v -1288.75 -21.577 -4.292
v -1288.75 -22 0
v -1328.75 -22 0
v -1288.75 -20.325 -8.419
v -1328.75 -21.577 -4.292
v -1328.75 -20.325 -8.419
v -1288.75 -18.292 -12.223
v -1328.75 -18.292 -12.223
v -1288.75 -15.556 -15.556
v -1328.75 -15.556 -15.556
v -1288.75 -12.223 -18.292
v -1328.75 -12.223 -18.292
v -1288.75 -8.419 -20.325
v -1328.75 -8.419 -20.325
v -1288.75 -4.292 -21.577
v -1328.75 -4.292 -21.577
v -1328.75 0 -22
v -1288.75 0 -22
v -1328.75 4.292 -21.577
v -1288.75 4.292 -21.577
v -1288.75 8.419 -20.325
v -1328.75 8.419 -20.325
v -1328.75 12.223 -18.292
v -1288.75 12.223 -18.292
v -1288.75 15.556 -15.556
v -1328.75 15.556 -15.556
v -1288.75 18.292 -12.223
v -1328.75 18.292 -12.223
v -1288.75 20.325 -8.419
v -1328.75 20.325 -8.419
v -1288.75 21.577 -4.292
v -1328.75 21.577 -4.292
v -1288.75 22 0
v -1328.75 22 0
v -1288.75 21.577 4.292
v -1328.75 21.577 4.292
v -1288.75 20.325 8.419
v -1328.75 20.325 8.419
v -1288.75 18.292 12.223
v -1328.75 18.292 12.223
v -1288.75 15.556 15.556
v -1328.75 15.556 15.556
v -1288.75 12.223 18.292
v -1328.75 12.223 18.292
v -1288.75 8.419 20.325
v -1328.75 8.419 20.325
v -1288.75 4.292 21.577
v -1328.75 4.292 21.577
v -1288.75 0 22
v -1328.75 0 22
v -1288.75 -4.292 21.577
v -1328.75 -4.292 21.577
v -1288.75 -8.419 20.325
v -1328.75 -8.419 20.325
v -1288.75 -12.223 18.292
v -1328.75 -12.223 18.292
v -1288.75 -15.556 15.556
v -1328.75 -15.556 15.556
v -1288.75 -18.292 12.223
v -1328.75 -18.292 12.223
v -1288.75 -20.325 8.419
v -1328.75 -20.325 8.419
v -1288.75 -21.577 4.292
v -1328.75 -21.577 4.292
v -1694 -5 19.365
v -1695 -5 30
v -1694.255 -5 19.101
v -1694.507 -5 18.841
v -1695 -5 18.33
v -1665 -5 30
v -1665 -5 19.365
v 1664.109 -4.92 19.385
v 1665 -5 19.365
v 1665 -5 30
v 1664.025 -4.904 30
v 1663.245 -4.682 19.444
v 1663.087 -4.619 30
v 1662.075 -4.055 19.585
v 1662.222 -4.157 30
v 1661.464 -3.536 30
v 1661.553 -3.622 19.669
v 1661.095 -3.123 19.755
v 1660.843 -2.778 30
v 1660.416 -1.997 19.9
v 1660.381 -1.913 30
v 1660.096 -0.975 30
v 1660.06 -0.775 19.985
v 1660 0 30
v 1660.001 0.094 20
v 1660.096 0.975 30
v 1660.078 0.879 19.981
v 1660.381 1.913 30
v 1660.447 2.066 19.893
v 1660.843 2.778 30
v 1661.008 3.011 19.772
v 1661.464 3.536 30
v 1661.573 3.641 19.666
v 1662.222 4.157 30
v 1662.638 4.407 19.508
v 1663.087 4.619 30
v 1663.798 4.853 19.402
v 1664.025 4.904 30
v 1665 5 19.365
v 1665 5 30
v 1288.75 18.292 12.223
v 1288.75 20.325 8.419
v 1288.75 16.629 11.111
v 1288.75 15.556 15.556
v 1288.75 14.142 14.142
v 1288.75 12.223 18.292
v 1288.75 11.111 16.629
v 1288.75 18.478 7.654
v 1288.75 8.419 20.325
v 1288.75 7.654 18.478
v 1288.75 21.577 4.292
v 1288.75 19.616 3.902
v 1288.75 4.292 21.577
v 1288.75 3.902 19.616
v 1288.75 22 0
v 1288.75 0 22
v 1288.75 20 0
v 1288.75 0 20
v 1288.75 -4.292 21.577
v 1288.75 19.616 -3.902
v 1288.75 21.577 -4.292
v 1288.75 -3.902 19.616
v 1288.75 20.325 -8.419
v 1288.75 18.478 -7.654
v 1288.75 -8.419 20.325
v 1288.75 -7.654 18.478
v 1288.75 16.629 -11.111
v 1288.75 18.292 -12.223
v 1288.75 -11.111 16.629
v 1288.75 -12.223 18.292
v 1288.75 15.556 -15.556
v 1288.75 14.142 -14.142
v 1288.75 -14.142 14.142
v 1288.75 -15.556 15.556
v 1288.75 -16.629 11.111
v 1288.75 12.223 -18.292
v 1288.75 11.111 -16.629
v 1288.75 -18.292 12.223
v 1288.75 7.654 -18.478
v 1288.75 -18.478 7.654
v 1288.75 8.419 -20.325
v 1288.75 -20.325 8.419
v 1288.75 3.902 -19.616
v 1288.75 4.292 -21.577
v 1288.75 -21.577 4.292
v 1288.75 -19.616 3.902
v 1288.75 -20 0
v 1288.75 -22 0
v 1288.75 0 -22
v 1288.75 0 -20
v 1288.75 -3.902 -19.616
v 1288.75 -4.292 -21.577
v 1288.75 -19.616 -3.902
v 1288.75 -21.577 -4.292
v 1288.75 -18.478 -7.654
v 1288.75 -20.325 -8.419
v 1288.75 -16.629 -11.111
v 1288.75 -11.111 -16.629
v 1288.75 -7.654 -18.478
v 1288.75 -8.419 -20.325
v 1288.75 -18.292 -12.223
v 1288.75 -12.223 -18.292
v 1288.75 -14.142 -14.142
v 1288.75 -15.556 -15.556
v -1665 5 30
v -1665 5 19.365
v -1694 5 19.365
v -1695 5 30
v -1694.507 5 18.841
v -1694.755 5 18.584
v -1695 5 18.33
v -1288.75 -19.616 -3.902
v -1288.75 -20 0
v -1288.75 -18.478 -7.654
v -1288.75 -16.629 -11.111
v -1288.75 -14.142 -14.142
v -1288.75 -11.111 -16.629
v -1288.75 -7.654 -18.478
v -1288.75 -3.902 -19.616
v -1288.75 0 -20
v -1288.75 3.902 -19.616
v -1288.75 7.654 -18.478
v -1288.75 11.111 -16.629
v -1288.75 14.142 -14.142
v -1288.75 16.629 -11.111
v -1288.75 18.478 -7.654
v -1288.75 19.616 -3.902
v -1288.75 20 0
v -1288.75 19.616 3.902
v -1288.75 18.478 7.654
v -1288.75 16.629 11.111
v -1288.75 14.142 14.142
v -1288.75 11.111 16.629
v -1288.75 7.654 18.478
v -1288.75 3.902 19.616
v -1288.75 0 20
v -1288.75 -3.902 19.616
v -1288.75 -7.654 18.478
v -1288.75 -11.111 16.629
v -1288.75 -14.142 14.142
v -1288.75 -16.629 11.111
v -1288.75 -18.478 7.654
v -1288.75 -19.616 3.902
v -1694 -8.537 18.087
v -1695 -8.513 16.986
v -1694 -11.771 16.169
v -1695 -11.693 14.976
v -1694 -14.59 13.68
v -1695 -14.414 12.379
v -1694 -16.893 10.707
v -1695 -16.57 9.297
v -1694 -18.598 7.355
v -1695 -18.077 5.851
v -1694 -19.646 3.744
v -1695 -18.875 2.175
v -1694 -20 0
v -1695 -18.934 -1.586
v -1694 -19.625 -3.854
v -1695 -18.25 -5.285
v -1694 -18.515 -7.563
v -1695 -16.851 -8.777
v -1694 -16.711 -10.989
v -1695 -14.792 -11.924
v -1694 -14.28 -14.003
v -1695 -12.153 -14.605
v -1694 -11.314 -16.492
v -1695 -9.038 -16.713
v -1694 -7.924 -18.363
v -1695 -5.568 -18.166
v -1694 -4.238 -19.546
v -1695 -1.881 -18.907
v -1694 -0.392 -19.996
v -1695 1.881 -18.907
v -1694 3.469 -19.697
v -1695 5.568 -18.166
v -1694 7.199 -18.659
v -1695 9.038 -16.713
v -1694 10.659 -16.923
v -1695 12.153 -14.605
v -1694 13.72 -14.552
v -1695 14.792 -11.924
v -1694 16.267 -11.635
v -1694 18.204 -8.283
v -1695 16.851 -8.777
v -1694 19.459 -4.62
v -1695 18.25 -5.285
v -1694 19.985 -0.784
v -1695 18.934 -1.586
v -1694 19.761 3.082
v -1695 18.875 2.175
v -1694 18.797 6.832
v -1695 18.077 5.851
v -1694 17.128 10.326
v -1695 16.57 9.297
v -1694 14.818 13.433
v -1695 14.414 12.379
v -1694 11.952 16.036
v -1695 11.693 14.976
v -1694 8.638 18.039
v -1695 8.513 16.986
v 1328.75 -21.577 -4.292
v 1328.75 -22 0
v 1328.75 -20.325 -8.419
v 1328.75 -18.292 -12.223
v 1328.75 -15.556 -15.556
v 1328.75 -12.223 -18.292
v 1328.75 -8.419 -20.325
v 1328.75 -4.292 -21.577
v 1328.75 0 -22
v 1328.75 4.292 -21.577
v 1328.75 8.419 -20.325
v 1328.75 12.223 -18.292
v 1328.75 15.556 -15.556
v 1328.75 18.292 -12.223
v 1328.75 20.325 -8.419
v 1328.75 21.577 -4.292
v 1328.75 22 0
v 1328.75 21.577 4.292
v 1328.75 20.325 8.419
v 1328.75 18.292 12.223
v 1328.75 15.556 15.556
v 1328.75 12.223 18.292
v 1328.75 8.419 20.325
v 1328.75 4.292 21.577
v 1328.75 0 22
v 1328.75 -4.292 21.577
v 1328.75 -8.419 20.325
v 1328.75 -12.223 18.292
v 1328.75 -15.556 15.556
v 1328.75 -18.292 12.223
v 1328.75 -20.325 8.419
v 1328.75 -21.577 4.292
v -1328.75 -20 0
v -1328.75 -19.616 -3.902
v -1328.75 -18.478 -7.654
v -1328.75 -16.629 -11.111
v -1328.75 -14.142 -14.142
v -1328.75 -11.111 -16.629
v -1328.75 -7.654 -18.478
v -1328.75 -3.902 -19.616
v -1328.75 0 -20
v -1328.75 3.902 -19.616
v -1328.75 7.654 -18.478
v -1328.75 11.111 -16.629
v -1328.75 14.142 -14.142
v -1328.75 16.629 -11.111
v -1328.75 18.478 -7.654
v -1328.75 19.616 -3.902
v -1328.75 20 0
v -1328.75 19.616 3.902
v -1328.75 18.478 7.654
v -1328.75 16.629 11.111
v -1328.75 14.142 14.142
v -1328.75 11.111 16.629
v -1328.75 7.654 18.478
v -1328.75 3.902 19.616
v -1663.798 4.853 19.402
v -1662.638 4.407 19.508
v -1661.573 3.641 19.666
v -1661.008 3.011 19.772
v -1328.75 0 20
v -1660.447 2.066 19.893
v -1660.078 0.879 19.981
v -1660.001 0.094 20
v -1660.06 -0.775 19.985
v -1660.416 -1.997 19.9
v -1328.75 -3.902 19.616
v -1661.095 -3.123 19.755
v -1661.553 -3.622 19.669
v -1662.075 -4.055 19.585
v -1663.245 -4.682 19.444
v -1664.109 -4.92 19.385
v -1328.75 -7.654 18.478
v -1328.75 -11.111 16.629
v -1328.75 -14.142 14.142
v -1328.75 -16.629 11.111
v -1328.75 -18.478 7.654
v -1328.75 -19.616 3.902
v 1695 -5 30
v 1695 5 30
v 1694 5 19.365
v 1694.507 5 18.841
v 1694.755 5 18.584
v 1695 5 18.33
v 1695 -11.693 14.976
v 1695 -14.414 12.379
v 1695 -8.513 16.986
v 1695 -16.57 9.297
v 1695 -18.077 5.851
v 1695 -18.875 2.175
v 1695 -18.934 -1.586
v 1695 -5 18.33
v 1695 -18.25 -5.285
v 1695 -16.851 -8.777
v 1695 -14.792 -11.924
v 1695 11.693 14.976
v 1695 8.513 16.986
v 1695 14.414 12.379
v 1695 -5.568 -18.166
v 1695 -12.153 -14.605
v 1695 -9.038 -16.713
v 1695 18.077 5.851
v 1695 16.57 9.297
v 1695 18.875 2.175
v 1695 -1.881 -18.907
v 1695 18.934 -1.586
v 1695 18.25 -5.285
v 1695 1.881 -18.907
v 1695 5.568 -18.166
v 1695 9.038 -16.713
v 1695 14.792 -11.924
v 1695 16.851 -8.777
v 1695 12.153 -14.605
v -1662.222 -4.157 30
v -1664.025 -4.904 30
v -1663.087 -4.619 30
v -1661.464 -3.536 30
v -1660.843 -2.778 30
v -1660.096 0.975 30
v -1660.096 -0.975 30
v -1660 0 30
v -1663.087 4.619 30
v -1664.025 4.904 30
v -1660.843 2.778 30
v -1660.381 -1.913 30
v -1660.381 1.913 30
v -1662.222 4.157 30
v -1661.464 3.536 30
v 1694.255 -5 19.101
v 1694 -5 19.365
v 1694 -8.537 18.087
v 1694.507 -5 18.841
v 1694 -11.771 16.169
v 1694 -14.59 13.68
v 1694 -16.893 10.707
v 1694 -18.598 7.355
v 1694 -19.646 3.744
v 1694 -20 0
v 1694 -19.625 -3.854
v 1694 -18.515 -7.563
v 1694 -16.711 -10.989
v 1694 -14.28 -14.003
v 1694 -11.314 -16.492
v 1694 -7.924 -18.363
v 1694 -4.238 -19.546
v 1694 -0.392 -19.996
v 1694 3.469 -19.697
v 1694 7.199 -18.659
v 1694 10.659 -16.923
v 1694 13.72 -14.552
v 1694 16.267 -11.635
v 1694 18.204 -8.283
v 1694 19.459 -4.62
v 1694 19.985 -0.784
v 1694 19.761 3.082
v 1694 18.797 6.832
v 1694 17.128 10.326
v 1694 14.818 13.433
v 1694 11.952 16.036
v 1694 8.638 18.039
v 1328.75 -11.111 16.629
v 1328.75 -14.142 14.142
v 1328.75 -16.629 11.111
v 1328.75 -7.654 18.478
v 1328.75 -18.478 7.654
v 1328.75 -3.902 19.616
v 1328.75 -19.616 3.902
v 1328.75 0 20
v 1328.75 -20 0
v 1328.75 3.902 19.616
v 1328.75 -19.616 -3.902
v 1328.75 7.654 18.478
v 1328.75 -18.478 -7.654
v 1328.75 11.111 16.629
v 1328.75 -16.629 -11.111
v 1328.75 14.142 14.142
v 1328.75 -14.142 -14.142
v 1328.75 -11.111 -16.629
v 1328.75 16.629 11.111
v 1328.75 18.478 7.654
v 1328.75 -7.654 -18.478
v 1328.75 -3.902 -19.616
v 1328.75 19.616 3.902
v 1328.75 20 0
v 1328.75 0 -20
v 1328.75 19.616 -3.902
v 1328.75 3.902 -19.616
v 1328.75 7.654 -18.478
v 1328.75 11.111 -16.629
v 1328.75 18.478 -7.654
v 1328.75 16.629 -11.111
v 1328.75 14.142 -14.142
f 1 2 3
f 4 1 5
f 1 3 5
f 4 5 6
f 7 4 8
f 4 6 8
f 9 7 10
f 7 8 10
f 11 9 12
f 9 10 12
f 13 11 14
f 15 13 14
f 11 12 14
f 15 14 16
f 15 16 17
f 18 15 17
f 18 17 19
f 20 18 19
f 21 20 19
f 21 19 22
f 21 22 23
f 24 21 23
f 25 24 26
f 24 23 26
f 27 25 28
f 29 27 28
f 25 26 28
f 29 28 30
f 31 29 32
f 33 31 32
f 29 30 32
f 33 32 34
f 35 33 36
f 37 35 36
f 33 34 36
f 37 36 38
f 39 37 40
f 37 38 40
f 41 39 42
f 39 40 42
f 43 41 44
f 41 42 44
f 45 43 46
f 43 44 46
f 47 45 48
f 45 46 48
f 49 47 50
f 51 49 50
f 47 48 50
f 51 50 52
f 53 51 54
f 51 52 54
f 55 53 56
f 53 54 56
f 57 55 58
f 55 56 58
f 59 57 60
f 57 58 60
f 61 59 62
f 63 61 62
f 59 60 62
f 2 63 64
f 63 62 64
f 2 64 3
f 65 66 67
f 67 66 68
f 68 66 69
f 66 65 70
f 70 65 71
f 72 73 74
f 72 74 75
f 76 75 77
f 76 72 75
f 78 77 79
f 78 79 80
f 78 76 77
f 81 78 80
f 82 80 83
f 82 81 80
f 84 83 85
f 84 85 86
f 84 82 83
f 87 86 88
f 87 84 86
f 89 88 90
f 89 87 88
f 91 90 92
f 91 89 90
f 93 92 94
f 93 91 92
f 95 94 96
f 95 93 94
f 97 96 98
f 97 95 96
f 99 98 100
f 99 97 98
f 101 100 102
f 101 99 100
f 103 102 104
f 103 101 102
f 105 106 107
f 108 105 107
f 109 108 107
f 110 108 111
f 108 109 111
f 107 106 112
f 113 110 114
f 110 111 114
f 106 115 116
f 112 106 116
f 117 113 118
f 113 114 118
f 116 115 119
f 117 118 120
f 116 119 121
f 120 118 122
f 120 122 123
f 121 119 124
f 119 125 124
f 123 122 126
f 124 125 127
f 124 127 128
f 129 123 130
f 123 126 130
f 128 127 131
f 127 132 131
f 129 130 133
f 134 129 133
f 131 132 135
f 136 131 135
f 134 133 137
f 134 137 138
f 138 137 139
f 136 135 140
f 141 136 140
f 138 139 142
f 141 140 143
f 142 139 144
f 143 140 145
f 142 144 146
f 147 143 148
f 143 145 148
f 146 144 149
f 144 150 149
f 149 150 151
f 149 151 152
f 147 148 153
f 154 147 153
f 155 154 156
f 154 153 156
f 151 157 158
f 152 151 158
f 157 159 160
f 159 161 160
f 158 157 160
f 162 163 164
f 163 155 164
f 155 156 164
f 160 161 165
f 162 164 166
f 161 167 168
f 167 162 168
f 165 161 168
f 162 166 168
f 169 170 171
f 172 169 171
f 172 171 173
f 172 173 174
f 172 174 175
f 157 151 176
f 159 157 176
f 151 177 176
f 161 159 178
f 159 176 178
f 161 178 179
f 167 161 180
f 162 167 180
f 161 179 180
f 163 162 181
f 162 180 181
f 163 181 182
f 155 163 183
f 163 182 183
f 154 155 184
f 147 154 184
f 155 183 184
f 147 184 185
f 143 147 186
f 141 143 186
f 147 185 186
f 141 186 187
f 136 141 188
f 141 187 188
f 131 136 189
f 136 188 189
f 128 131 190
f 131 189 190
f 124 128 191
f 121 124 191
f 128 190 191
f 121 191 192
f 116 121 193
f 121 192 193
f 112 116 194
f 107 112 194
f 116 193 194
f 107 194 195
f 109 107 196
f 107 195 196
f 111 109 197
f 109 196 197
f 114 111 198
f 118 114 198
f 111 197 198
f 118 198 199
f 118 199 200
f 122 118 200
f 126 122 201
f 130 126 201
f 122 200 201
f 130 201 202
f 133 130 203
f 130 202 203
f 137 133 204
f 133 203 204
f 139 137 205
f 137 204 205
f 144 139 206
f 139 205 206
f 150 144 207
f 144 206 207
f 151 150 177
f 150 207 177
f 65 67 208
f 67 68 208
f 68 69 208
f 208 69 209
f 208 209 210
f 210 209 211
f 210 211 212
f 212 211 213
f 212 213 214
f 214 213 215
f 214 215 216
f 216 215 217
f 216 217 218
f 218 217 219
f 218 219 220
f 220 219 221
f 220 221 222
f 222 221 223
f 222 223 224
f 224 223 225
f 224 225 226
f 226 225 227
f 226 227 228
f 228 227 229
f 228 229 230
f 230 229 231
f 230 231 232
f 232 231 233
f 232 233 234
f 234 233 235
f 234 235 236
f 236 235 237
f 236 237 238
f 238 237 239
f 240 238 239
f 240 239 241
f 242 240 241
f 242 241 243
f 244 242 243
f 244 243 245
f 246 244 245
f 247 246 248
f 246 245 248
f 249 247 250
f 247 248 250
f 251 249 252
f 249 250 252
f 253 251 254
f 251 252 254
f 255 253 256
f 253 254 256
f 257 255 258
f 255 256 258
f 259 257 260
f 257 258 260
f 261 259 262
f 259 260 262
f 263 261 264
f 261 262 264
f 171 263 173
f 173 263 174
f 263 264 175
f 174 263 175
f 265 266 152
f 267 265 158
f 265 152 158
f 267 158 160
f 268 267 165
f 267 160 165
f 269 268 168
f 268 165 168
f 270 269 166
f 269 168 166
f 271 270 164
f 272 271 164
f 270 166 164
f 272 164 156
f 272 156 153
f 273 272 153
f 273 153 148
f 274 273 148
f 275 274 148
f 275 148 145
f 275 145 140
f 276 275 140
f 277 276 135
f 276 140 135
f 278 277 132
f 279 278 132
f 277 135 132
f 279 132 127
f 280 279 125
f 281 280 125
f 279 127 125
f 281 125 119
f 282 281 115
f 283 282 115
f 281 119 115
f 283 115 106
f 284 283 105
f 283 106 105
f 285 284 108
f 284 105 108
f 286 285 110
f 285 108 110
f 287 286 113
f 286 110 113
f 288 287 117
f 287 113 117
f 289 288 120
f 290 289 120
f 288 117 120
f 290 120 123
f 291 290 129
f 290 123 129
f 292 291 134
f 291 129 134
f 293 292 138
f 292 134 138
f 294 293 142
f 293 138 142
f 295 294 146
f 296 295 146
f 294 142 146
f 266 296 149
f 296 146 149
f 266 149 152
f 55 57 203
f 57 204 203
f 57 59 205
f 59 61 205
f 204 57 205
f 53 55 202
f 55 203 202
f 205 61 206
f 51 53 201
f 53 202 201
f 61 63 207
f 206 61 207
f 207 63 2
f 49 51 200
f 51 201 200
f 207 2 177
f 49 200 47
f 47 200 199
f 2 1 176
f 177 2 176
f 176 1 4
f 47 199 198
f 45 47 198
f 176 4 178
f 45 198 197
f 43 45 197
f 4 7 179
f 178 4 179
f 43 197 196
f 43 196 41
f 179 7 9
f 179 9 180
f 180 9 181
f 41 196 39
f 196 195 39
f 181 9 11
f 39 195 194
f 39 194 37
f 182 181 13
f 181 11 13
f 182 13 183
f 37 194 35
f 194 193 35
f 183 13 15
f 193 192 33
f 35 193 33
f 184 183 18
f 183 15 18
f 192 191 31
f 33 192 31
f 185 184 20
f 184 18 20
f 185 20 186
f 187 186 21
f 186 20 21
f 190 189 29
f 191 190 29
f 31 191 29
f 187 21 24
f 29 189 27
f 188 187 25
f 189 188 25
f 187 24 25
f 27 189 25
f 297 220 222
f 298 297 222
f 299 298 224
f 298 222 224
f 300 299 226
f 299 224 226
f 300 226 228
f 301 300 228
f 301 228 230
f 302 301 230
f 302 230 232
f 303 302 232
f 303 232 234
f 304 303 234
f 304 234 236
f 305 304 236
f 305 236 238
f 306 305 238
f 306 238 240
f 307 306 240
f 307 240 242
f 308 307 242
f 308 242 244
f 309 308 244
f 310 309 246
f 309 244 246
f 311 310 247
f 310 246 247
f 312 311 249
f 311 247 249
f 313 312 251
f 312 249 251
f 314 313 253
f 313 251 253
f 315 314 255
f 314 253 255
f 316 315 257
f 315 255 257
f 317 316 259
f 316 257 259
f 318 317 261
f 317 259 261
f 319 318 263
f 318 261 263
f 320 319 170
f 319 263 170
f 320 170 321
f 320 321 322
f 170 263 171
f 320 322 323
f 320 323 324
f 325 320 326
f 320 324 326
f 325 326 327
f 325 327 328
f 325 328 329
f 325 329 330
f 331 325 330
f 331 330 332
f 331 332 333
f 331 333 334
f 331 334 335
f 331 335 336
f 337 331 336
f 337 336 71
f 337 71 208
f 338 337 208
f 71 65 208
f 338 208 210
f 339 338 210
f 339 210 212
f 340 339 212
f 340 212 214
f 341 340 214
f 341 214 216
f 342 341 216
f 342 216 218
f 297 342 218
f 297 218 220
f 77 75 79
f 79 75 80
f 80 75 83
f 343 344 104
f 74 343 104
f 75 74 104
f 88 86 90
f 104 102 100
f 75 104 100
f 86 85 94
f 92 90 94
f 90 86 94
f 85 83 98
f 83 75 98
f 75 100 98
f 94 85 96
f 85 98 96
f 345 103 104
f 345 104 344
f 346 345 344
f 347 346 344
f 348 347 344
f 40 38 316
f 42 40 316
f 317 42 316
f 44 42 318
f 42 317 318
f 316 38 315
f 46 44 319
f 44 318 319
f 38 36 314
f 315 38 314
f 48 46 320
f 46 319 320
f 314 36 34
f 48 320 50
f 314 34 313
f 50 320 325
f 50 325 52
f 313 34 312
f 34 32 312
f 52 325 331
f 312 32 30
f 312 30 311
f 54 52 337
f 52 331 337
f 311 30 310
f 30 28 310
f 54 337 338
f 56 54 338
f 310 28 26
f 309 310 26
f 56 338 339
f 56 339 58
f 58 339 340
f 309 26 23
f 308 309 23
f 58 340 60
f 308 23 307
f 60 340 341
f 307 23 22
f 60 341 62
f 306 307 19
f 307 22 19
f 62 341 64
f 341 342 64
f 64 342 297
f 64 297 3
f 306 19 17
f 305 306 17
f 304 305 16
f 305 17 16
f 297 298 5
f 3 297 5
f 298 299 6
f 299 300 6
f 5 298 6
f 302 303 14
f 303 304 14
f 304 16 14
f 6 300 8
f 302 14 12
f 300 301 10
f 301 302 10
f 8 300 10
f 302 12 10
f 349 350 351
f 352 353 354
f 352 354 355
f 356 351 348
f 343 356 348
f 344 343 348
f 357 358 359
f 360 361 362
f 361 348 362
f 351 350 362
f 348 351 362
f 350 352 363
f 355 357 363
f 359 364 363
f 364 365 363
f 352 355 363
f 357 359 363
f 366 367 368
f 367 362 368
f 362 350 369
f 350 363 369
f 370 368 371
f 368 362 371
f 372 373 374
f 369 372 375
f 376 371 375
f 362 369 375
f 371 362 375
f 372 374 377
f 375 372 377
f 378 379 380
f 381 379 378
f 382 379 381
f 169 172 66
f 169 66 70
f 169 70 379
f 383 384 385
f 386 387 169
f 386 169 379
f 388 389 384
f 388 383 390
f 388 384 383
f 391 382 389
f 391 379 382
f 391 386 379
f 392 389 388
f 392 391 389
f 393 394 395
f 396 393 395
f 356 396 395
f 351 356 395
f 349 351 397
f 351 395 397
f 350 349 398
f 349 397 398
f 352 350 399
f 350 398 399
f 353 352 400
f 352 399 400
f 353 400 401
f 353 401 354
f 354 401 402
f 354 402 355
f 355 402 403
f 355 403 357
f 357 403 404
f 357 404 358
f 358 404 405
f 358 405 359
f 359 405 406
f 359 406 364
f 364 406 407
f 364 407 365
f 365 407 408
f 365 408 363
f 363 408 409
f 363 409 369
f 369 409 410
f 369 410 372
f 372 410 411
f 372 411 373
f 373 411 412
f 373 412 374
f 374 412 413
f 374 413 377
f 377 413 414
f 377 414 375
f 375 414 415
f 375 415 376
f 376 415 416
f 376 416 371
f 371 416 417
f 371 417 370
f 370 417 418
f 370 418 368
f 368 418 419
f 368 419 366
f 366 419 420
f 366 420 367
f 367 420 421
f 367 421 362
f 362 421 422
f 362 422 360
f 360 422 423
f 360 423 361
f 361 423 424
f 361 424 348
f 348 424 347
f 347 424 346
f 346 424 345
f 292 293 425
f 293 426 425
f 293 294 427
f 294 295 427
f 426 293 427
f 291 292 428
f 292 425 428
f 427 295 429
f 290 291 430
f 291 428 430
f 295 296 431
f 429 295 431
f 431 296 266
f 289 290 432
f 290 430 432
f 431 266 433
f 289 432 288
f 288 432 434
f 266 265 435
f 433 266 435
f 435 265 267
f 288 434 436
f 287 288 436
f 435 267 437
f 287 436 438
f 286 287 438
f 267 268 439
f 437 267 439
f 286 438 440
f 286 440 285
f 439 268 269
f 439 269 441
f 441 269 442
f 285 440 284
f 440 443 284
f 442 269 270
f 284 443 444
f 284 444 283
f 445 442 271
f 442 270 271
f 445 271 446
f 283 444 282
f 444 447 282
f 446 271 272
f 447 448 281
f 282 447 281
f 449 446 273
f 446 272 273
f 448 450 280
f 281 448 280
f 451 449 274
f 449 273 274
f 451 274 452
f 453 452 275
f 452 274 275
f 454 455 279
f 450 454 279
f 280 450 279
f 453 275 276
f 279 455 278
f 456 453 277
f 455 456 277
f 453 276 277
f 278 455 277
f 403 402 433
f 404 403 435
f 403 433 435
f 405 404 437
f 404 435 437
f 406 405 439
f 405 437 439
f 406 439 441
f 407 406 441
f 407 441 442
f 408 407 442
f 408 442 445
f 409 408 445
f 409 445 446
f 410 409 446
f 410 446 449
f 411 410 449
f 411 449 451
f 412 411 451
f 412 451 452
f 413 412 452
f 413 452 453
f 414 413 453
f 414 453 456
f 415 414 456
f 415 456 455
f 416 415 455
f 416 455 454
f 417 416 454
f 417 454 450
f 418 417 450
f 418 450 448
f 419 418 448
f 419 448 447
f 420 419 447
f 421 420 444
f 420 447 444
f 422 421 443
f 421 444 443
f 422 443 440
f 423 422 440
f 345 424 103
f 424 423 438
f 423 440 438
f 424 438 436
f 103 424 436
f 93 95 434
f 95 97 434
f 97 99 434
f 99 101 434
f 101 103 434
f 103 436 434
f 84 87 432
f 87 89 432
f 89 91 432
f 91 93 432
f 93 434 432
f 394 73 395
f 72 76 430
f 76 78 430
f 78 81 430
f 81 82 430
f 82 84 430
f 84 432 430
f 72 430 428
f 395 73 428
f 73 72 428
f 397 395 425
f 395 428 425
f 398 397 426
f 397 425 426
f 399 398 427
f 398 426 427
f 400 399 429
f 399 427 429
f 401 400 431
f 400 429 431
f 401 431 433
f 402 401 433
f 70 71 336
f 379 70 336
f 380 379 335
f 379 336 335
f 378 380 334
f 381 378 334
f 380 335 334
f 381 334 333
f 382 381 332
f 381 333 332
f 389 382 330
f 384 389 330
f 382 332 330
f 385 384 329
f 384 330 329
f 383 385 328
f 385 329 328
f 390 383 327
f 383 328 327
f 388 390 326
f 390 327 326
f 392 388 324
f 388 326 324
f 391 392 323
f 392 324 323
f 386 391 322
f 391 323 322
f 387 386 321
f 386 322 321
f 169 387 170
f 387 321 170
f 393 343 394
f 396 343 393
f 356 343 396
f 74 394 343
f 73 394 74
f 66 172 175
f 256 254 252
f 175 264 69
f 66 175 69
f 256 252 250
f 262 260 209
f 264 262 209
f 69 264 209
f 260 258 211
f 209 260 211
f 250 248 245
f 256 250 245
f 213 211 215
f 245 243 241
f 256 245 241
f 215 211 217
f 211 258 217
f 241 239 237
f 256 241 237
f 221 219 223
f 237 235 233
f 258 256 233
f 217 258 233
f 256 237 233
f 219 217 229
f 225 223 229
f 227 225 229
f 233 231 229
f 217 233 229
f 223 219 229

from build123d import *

# Parameters (mm, degrees)
CHAMFER1_SIZE            = 1
BOSS_EXTRUDE2_DEPTH      = 10
BOSS_EXTRUDE2_DEPTH_BACK = 5


with BuildPart() as part:
    # Sketch1 → Revolve1 (revolve)
    with BuildSketch(Plane.XY):
        Polygon((-1695, 0), (1695, 0), (1695, -20), (1328.75, -20), (1328.75, -22), (1288.75, -22), (1288.75, -20), (-1288.75, -20), (-1288.75, -22), (-1328.75, -22), (-1328.75, -20), (-1695, -20), align=None)
    revolve(axis=Axis((-1695, 0, 0), (1, 0, 0)))

    # Chamfer1
    chamfer1_edges = [part.edges().sort_by_distance(p)[0] for p in [
        (1695, 20, 0),
        (-1695, 20, 0),
    ]]
    chamfer(chamfer1_edges, length=CHAMFER1_SIZE)

    # Sketch3 → Boss-Extrude2 (add, two sides: drawn at the far end of the back side and taken through both)
    with BuildSketch(Plane.XY.offset(20).offset(-BOSS_EXTRUDE2_DEPTH_BACK)):
        with BuildLine():
            Line((1665, 5), (1695, 5))
            Line((1695, 5), (1695, -5))
            Line((1695, -5), (1665, -5))
            ThreePointArc((1665, -5), (1660, 0), (1665, 5))
        make_face()
        with BuildLine():
            Line((-1695, 5), (-1695, -5))
            Line((-1695, -5), (-1665, -5))
            ThreePointArc((-1665, -5), (-1660, 0), (-1665, 5))
            Line((-1665, 5), (-1695, 5))
        make_face()
    extrude(amount=BOSS_EXTRUDE2_DEPTH + BOSS_EXTRUDE2_DEPTH_BACK)


solid = part.part
